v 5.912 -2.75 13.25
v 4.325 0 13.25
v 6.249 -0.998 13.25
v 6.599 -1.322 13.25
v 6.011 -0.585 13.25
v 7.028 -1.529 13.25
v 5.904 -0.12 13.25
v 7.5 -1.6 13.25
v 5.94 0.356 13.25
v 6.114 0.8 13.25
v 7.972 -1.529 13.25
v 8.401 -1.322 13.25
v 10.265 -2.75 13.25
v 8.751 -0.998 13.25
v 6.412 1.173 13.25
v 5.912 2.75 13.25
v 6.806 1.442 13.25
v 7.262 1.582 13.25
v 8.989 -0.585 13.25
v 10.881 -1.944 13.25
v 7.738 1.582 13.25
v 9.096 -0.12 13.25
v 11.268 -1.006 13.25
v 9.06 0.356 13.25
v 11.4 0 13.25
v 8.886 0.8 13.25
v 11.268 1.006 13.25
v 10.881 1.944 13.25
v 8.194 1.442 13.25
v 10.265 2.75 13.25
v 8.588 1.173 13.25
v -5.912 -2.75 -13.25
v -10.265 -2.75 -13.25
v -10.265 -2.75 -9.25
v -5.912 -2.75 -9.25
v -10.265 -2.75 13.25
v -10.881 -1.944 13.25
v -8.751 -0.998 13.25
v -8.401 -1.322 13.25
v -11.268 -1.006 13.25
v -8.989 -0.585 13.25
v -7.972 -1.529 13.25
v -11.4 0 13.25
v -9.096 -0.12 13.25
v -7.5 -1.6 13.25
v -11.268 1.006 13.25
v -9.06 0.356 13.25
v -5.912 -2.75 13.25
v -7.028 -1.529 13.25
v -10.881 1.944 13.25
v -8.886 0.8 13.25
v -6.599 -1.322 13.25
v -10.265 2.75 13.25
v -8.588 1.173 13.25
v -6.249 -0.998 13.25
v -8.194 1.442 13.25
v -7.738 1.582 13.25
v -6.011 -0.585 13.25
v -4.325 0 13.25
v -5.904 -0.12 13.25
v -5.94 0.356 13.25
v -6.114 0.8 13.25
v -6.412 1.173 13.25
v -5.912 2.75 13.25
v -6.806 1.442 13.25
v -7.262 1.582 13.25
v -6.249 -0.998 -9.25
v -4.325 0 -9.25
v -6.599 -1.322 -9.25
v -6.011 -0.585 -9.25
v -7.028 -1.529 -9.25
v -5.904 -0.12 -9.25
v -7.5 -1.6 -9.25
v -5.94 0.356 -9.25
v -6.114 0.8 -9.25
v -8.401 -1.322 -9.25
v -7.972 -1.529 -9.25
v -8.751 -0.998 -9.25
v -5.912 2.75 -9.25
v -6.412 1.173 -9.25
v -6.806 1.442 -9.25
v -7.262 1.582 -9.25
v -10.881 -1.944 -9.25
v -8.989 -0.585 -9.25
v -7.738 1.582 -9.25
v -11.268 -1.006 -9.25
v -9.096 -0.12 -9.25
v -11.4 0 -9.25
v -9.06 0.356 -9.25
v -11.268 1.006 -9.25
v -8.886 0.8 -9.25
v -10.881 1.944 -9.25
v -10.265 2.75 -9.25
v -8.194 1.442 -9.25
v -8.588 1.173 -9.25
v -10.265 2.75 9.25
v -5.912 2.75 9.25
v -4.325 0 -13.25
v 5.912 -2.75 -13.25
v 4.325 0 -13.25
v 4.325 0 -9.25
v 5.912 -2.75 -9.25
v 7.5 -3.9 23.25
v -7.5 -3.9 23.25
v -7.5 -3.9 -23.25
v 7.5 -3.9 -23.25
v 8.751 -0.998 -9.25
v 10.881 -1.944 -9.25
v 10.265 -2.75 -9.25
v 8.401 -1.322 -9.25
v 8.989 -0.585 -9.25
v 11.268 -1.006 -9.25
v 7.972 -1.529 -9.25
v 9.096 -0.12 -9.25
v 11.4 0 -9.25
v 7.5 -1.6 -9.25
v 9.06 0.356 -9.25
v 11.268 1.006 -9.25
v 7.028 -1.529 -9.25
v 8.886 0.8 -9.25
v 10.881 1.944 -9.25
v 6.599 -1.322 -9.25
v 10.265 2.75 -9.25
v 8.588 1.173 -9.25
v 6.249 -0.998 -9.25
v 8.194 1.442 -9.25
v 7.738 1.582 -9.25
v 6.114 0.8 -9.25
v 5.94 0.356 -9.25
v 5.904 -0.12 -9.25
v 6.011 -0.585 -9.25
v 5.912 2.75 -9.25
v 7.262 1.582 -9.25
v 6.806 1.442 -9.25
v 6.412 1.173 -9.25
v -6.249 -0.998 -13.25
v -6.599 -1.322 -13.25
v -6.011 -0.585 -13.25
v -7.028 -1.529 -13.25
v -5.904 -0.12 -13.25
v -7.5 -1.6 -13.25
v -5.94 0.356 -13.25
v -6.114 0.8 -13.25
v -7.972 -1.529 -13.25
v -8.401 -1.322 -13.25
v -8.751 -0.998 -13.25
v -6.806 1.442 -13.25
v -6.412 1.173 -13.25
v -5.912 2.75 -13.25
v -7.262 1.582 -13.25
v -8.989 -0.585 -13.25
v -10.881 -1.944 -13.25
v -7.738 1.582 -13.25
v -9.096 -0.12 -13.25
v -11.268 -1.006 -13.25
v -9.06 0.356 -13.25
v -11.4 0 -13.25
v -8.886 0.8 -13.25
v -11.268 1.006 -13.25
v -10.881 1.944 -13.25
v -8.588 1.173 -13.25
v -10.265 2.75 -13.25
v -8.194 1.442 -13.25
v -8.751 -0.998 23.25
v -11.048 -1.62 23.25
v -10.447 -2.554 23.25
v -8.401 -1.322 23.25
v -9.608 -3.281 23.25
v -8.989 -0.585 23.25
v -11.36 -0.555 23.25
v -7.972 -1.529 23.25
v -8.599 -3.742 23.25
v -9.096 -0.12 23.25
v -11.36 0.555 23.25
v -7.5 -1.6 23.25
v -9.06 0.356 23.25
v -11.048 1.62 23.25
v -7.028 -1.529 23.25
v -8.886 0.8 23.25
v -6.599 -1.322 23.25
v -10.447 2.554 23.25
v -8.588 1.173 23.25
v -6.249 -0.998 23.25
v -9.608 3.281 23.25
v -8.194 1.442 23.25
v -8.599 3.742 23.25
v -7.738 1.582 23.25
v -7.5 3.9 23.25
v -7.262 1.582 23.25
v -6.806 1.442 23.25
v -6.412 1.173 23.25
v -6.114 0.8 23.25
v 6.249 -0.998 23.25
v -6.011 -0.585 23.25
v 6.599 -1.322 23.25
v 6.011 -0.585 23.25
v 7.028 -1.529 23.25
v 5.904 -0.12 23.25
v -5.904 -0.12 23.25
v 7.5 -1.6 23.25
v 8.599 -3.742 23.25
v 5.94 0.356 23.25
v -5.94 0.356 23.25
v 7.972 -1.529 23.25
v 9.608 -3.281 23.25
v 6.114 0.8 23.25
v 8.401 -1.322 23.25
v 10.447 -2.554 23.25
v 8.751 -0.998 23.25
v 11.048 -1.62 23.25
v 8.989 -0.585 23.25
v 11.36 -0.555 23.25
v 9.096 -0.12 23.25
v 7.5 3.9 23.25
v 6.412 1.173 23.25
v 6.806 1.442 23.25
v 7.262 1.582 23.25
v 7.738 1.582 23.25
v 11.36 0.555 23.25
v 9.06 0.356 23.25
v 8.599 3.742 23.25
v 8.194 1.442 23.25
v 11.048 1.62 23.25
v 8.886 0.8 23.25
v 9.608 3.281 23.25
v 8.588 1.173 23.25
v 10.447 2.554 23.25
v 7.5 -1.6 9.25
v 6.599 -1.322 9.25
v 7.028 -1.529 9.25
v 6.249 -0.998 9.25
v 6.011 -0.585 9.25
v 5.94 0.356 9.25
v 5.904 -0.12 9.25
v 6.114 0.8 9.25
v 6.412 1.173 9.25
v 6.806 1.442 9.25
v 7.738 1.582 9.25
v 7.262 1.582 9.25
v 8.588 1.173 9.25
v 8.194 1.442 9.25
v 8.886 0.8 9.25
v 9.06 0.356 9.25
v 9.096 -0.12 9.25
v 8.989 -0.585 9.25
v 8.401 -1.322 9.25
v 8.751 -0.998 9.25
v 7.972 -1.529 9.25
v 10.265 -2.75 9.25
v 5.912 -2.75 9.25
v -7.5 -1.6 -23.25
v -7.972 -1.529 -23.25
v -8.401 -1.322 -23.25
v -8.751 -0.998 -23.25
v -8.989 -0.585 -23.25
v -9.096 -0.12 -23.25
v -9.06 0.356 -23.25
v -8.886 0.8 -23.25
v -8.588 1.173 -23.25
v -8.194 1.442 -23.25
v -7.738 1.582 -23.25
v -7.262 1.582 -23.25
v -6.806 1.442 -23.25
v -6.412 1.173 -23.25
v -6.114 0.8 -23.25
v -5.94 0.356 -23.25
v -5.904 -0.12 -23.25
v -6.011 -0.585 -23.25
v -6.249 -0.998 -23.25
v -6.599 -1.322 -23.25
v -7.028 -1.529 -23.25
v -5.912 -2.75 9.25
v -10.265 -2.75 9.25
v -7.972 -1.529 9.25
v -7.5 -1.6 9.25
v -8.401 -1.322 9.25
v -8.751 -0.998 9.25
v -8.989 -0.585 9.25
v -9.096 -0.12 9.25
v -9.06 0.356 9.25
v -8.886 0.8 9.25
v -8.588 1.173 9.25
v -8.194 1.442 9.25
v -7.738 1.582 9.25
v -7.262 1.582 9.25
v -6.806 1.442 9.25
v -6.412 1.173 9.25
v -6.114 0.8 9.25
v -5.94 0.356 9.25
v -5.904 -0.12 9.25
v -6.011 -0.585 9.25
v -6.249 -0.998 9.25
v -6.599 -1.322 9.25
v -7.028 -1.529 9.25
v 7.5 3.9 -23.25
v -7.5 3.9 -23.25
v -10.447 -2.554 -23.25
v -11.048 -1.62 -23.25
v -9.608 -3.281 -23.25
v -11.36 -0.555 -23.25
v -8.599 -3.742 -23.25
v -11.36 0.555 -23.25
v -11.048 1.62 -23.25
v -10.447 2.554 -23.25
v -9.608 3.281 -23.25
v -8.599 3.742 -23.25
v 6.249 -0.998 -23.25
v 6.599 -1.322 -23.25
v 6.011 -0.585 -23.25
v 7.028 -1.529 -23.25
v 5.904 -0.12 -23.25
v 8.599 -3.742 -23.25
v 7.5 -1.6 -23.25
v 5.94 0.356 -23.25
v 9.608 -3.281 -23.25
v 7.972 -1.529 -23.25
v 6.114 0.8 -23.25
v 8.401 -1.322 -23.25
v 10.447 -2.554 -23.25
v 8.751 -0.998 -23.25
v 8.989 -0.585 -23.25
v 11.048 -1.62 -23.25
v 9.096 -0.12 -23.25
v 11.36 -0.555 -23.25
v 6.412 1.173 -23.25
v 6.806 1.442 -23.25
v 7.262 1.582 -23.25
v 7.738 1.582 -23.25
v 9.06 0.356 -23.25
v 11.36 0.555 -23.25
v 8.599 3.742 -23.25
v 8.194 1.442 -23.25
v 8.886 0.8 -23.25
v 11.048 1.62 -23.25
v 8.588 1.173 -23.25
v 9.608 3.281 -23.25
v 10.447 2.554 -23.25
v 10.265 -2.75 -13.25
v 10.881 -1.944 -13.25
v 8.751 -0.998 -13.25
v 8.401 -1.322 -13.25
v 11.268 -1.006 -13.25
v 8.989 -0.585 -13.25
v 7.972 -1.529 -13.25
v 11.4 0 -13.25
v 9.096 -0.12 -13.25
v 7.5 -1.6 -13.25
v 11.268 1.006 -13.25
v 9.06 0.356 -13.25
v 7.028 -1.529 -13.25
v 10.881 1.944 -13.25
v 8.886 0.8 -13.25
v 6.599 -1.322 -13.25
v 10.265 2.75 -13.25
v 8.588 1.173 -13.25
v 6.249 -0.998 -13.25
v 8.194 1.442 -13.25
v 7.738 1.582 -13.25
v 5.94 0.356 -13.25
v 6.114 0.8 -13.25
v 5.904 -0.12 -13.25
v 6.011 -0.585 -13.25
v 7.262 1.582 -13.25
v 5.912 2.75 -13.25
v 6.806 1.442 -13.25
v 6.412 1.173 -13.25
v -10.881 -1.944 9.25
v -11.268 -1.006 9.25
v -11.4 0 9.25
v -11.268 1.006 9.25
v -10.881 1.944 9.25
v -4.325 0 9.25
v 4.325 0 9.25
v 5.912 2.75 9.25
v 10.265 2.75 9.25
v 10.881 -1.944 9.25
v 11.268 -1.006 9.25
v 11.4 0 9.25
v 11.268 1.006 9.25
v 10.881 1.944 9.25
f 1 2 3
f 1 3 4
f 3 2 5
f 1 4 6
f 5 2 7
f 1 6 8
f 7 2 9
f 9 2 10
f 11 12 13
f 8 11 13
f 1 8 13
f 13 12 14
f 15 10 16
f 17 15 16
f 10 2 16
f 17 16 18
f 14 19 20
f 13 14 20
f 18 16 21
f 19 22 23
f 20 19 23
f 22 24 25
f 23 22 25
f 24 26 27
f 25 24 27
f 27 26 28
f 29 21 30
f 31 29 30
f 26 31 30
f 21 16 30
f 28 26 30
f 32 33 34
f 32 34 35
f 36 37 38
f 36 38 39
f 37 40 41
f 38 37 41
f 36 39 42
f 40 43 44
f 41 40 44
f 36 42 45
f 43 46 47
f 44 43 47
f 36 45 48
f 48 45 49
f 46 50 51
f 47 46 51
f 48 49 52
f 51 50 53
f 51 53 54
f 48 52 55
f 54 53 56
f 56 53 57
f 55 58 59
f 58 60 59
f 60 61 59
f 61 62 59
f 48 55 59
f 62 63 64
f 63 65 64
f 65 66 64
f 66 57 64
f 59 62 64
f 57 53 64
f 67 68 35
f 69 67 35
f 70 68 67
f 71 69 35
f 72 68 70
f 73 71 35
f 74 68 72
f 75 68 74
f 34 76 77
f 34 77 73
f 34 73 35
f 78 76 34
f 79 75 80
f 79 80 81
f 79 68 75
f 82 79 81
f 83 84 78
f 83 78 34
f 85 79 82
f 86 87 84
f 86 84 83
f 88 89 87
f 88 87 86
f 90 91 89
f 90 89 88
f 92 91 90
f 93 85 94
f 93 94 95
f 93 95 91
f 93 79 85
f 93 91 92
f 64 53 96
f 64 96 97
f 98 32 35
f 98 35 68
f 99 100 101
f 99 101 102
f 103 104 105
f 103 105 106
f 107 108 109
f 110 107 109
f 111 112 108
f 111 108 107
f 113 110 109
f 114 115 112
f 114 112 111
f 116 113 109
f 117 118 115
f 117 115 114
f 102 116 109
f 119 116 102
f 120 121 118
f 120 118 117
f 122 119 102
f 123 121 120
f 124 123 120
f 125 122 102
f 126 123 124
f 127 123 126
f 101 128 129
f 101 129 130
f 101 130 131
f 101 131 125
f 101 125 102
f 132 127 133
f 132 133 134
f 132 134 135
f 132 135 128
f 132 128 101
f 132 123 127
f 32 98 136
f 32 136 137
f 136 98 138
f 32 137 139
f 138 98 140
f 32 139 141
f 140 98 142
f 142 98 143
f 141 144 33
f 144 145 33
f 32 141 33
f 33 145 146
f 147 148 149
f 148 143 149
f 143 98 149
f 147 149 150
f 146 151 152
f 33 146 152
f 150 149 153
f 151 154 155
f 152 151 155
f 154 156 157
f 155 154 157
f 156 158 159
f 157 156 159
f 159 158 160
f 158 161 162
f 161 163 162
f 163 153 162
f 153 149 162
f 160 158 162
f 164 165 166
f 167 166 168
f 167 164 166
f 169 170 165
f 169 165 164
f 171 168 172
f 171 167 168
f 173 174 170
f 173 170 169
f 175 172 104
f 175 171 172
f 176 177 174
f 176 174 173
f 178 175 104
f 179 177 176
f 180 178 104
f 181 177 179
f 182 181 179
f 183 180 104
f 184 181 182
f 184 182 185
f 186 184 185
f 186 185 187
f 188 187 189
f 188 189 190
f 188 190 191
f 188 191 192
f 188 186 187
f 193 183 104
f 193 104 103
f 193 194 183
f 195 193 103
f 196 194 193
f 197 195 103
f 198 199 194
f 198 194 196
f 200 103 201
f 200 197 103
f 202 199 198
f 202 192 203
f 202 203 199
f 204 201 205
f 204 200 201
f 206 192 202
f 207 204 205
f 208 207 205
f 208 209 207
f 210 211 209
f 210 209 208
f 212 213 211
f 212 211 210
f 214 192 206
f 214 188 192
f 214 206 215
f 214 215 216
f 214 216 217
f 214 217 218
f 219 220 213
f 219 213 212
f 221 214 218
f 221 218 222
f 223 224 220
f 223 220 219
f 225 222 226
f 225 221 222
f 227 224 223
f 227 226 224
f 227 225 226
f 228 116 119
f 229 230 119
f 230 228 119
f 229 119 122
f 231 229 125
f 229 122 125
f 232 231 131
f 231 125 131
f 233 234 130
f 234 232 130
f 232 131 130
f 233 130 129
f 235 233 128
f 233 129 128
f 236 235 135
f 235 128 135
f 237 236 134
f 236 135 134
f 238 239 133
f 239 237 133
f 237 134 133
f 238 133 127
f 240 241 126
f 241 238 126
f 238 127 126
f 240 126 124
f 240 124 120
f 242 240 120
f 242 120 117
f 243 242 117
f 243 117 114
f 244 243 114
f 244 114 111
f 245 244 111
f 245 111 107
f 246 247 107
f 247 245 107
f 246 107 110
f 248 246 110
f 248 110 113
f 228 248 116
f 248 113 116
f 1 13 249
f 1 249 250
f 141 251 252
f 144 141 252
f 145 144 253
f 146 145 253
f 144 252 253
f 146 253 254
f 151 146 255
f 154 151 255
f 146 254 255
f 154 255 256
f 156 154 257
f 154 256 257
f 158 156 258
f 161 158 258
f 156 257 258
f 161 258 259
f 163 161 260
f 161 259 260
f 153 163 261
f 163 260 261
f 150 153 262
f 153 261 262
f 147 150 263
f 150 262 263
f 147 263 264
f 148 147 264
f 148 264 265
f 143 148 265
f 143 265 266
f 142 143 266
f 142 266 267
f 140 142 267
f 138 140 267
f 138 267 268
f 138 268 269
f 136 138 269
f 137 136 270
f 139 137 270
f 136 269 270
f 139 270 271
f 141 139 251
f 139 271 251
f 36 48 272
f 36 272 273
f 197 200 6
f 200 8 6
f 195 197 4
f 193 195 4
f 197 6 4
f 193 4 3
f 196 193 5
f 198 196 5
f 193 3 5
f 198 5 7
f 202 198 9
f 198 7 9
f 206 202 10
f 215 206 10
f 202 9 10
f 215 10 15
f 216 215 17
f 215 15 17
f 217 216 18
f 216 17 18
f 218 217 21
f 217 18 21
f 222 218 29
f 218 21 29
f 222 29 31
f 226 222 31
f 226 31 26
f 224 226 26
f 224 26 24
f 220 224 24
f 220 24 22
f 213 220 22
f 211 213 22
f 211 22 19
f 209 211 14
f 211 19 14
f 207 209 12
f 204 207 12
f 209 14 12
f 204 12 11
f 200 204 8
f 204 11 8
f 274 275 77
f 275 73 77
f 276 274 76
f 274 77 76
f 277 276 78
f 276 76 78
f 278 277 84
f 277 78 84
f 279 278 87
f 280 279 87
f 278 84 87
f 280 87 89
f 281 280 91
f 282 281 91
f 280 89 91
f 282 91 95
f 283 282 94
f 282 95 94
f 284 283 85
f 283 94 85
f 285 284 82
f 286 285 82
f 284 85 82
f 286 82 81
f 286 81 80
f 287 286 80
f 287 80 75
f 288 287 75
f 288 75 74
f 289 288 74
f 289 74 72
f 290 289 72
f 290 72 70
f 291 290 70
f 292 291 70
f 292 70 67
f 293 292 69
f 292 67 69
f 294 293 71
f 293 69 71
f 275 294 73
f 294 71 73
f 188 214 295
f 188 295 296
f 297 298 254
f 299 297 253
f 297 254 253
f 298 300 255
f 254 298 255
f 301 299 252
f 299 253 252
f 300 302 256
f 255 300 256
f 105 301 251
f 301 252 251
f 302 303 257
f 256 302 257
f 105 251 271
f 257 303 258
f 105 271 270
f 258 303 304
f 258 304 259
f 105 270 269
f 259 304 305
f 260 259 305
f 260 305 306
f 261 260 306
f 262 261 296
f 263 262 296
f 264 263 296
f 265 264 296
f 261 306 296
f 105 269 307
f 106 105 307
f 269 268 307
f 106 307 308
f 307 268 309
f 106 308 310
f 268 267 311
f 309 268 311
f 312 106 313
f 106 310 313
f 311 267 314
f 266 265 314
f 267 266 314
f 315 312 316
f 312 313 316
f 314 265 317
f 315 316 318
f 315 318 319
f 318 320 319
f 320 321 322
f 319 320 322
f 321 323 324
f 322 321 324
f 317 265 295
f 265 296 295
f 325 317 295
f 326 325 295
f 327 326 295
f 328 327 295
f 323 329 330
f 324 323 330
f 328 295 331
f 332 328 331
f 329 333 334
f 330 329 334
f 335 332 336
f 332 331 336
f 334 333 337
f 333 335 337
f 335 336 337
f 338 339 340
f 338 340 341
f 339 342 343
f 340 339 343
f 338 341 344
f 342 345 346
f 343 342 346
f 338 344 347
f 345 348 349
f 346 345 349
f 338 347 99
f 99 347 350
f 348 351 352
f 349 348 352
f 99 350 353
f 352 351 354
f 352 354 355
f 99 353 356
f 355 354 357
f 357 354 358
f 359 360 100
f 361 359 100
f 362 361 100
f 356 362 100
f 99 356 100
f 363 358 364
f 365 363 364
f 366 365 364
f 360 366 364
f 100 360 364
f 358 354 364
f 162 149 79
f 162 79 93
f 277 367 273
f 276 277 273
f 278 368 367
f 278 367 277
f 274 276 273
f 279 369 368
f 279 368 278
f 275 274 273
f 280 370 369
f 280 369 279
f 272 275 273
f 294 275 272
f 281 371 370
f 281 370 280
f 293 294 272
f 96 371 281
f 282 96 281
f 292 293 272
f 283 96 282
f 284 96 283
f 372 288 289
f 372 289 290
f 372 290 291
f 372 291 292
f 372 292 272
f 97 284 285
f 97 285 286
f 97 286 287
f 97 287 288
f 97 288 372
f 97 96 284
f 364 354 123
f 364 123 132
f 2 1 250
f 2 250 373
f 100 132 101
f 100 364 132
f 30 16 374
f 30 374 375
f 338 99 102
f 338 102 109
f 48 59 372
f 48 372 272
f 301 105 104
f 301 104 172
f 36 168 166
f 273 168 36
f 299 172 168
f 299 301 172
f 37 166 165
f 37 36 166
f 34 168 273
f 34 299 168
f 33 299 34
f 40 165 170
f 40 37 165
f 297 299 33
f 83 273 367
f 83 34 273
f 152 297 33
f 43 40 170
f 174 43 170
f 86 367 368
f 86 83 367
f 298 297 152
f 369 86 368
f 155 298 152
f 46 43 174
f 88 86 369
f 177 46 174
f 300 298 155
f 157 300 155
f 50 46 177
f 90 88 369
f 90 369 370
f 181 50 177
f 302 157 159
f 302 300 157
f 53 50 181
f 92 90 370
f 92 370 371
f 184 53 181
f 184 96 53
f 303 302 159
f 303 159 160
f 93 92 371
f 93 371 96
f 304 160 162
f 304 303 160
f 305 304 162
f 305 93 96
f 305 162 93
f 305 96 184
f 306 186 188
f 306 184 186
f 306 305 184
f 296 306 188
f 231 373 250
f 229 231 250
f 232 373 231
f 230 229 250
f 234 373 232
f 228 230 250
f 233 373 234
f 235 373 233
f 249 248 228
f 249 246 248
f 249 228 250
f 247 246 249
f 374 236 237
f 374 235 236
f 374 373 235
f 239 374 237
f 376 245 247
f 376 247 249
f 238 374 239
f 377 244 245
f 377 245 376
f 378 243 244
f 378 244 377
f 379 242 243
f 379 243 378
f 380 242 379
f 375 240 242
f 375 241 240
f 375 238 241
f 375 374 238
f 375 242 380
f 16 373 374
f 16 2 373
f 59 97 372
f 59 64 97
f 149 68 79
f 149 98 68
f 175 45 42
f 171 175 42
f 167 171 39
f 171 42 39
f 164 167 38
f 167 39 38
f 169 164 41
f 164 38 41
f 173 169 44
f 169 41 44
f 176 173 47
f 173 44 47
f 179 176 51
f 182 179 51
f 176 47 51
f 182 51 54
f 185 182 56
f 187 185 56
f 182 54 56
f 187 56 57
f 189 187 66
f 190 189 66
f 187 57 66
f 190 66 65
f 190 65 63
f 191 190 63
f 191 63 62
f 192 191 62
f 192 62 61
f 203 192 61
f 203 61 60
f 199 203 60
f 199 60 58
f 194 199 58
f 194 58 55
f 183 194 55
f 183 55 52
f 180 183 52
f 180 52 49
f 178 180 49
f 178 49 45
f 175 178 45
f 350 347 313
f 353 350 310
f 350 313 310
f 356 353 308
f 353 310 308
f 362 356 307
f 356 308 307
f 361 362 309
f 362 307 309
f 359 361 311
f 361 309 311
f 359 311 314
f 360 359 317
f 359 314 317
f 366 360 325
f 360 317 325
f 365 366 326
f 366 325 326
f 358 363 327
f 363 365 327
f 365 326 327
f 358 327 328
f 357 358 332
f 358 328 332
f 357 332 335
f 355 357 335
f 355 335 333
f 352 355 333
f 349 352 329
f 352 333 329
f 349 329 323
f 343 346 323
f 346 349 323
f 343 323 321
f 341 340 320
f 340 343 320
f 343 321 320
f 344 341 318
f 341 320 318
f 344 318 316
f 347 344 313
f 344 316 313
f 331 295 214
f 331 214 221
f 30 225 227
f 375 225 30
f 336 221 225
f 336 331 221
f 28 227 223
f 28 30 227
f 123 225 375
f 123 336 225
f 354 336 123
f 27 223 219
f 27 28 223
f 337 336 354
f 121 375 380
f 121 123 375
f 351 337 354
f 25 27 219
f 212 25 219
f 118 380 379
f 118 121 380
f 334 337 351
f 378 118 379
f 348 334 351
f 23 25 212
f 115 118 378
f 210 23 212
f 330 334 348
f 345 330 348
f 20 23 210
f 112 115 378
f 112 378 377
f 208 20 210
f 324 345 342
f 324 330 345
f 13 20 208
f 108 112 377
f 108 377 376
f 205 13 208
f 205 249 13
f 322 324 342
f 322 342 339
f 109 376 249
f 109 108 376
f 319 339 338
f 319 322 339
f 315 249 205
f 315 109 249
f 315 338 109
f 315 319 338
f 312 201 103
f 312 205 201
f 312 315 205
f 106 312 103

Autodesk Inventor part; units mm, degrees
ref_plane "YZ Plane" through (0, 0, 0) normal (1, 0, 0) x (0, 1, 0)
ref_plane "XZ Plane" through (0, 0, 0) normal (0, 1, 0) x (-1, 0, 0)
sketch "Sketch1" plane through (0, 0, 0) normal (0, 0, 1) x (1, 0, 0)
  line L0 (-7.5, 0) -> (7.5, 0) construction
  line L1 (-7.5, -3.9) -> (7.5, -3.9)
  line L2 (7.5, 3.9) -> (-7.5, 3.9)
  arc A0 (-7.5, 3.9) -> (-7.5, -3.9) centre (-7.5, 0) ccw
  arc A1 (7.5, -3.9) -> (7.5, 3.9) centre (7.5, 0) ccw
  point P0 (0, 0)
  point P1 (0, 0)
  dimension "d0" = 3.9
  dimension "d1" = 15
extrude "Extrusion1" add sketch "Sketch1" along normal mid plane 46.5
sketch "Sketch2" plane through (0, 0, 23.25) normal (0, 0, 1) x (1, 0, 0)
  arc A0 (-7.5, 3.9) -> (-7.5, -3.9) centre (-7.5, 0) ccw projected
  arc A1 (7.5, -3.9) -> (7.5, 3.9) centre (7.5, 0) ccw projected
  point P0 (0, 0)
hole "Hole1" at (-7.5, 0, 23.25) at (7.5, 0, 23.25) direction (0, 0, -1) diameter 3.2 end through all clearance for "Flat Head Machine Screw" size "M3" standard "Ansi Metric M Profile"
ref_plane "Work Plane1" through (0, 0, 13.25) normal (0, 0, 1) x (1, 0, 0)
sketch "Sketch3" plane through (0, 0, 13.25) normal (0, 0, 1) x (1, 0, 0)
  circle A0 centre (-7.5, 0) radius 1.6 projected
  line L0 (-9.0877, 2.75) -> (-5.9123, 2.75)
  line L1 (-5.9123, 2.75) -> (-4.3246, 0)
  line L2 (-4.3246, 0) -> (-5.9123, -2.75)
  line L3 (-5.9123, -2.75) -> (-9.0877, -2.75)
  line L4 (-9.0877, -2.75) -> (-10.6754, 0)
  line L5 (-10.6754, 0) -> (-9.0877, 2.75)
  line L6 (-9.0877, 2.75) -> (-10.2654, 2.75)
  arc A1 (-7.5, 3.9) -> (-7.5, -3.9) centre (-7.5, 0) ccw projected
  line L7 (-9.0877, -2.75) -> (-10.2654, -2.75)
  point P0 (0, 0)
  dimension "d12" = 5.5
extrude "Extrusion2" cut sketch "Sketch3" against normal blind 4
mirror "Mirror1" about plane through (0, 0, 0) normal (1, 0, 0) of "Extrusion2"
mirror "Mirror2" about plane through (0, 0, 0) normal (0, 0, 1) of "Extrusion2", "Mirror1"
properties part number "Standoff" material "PET Plastic"
